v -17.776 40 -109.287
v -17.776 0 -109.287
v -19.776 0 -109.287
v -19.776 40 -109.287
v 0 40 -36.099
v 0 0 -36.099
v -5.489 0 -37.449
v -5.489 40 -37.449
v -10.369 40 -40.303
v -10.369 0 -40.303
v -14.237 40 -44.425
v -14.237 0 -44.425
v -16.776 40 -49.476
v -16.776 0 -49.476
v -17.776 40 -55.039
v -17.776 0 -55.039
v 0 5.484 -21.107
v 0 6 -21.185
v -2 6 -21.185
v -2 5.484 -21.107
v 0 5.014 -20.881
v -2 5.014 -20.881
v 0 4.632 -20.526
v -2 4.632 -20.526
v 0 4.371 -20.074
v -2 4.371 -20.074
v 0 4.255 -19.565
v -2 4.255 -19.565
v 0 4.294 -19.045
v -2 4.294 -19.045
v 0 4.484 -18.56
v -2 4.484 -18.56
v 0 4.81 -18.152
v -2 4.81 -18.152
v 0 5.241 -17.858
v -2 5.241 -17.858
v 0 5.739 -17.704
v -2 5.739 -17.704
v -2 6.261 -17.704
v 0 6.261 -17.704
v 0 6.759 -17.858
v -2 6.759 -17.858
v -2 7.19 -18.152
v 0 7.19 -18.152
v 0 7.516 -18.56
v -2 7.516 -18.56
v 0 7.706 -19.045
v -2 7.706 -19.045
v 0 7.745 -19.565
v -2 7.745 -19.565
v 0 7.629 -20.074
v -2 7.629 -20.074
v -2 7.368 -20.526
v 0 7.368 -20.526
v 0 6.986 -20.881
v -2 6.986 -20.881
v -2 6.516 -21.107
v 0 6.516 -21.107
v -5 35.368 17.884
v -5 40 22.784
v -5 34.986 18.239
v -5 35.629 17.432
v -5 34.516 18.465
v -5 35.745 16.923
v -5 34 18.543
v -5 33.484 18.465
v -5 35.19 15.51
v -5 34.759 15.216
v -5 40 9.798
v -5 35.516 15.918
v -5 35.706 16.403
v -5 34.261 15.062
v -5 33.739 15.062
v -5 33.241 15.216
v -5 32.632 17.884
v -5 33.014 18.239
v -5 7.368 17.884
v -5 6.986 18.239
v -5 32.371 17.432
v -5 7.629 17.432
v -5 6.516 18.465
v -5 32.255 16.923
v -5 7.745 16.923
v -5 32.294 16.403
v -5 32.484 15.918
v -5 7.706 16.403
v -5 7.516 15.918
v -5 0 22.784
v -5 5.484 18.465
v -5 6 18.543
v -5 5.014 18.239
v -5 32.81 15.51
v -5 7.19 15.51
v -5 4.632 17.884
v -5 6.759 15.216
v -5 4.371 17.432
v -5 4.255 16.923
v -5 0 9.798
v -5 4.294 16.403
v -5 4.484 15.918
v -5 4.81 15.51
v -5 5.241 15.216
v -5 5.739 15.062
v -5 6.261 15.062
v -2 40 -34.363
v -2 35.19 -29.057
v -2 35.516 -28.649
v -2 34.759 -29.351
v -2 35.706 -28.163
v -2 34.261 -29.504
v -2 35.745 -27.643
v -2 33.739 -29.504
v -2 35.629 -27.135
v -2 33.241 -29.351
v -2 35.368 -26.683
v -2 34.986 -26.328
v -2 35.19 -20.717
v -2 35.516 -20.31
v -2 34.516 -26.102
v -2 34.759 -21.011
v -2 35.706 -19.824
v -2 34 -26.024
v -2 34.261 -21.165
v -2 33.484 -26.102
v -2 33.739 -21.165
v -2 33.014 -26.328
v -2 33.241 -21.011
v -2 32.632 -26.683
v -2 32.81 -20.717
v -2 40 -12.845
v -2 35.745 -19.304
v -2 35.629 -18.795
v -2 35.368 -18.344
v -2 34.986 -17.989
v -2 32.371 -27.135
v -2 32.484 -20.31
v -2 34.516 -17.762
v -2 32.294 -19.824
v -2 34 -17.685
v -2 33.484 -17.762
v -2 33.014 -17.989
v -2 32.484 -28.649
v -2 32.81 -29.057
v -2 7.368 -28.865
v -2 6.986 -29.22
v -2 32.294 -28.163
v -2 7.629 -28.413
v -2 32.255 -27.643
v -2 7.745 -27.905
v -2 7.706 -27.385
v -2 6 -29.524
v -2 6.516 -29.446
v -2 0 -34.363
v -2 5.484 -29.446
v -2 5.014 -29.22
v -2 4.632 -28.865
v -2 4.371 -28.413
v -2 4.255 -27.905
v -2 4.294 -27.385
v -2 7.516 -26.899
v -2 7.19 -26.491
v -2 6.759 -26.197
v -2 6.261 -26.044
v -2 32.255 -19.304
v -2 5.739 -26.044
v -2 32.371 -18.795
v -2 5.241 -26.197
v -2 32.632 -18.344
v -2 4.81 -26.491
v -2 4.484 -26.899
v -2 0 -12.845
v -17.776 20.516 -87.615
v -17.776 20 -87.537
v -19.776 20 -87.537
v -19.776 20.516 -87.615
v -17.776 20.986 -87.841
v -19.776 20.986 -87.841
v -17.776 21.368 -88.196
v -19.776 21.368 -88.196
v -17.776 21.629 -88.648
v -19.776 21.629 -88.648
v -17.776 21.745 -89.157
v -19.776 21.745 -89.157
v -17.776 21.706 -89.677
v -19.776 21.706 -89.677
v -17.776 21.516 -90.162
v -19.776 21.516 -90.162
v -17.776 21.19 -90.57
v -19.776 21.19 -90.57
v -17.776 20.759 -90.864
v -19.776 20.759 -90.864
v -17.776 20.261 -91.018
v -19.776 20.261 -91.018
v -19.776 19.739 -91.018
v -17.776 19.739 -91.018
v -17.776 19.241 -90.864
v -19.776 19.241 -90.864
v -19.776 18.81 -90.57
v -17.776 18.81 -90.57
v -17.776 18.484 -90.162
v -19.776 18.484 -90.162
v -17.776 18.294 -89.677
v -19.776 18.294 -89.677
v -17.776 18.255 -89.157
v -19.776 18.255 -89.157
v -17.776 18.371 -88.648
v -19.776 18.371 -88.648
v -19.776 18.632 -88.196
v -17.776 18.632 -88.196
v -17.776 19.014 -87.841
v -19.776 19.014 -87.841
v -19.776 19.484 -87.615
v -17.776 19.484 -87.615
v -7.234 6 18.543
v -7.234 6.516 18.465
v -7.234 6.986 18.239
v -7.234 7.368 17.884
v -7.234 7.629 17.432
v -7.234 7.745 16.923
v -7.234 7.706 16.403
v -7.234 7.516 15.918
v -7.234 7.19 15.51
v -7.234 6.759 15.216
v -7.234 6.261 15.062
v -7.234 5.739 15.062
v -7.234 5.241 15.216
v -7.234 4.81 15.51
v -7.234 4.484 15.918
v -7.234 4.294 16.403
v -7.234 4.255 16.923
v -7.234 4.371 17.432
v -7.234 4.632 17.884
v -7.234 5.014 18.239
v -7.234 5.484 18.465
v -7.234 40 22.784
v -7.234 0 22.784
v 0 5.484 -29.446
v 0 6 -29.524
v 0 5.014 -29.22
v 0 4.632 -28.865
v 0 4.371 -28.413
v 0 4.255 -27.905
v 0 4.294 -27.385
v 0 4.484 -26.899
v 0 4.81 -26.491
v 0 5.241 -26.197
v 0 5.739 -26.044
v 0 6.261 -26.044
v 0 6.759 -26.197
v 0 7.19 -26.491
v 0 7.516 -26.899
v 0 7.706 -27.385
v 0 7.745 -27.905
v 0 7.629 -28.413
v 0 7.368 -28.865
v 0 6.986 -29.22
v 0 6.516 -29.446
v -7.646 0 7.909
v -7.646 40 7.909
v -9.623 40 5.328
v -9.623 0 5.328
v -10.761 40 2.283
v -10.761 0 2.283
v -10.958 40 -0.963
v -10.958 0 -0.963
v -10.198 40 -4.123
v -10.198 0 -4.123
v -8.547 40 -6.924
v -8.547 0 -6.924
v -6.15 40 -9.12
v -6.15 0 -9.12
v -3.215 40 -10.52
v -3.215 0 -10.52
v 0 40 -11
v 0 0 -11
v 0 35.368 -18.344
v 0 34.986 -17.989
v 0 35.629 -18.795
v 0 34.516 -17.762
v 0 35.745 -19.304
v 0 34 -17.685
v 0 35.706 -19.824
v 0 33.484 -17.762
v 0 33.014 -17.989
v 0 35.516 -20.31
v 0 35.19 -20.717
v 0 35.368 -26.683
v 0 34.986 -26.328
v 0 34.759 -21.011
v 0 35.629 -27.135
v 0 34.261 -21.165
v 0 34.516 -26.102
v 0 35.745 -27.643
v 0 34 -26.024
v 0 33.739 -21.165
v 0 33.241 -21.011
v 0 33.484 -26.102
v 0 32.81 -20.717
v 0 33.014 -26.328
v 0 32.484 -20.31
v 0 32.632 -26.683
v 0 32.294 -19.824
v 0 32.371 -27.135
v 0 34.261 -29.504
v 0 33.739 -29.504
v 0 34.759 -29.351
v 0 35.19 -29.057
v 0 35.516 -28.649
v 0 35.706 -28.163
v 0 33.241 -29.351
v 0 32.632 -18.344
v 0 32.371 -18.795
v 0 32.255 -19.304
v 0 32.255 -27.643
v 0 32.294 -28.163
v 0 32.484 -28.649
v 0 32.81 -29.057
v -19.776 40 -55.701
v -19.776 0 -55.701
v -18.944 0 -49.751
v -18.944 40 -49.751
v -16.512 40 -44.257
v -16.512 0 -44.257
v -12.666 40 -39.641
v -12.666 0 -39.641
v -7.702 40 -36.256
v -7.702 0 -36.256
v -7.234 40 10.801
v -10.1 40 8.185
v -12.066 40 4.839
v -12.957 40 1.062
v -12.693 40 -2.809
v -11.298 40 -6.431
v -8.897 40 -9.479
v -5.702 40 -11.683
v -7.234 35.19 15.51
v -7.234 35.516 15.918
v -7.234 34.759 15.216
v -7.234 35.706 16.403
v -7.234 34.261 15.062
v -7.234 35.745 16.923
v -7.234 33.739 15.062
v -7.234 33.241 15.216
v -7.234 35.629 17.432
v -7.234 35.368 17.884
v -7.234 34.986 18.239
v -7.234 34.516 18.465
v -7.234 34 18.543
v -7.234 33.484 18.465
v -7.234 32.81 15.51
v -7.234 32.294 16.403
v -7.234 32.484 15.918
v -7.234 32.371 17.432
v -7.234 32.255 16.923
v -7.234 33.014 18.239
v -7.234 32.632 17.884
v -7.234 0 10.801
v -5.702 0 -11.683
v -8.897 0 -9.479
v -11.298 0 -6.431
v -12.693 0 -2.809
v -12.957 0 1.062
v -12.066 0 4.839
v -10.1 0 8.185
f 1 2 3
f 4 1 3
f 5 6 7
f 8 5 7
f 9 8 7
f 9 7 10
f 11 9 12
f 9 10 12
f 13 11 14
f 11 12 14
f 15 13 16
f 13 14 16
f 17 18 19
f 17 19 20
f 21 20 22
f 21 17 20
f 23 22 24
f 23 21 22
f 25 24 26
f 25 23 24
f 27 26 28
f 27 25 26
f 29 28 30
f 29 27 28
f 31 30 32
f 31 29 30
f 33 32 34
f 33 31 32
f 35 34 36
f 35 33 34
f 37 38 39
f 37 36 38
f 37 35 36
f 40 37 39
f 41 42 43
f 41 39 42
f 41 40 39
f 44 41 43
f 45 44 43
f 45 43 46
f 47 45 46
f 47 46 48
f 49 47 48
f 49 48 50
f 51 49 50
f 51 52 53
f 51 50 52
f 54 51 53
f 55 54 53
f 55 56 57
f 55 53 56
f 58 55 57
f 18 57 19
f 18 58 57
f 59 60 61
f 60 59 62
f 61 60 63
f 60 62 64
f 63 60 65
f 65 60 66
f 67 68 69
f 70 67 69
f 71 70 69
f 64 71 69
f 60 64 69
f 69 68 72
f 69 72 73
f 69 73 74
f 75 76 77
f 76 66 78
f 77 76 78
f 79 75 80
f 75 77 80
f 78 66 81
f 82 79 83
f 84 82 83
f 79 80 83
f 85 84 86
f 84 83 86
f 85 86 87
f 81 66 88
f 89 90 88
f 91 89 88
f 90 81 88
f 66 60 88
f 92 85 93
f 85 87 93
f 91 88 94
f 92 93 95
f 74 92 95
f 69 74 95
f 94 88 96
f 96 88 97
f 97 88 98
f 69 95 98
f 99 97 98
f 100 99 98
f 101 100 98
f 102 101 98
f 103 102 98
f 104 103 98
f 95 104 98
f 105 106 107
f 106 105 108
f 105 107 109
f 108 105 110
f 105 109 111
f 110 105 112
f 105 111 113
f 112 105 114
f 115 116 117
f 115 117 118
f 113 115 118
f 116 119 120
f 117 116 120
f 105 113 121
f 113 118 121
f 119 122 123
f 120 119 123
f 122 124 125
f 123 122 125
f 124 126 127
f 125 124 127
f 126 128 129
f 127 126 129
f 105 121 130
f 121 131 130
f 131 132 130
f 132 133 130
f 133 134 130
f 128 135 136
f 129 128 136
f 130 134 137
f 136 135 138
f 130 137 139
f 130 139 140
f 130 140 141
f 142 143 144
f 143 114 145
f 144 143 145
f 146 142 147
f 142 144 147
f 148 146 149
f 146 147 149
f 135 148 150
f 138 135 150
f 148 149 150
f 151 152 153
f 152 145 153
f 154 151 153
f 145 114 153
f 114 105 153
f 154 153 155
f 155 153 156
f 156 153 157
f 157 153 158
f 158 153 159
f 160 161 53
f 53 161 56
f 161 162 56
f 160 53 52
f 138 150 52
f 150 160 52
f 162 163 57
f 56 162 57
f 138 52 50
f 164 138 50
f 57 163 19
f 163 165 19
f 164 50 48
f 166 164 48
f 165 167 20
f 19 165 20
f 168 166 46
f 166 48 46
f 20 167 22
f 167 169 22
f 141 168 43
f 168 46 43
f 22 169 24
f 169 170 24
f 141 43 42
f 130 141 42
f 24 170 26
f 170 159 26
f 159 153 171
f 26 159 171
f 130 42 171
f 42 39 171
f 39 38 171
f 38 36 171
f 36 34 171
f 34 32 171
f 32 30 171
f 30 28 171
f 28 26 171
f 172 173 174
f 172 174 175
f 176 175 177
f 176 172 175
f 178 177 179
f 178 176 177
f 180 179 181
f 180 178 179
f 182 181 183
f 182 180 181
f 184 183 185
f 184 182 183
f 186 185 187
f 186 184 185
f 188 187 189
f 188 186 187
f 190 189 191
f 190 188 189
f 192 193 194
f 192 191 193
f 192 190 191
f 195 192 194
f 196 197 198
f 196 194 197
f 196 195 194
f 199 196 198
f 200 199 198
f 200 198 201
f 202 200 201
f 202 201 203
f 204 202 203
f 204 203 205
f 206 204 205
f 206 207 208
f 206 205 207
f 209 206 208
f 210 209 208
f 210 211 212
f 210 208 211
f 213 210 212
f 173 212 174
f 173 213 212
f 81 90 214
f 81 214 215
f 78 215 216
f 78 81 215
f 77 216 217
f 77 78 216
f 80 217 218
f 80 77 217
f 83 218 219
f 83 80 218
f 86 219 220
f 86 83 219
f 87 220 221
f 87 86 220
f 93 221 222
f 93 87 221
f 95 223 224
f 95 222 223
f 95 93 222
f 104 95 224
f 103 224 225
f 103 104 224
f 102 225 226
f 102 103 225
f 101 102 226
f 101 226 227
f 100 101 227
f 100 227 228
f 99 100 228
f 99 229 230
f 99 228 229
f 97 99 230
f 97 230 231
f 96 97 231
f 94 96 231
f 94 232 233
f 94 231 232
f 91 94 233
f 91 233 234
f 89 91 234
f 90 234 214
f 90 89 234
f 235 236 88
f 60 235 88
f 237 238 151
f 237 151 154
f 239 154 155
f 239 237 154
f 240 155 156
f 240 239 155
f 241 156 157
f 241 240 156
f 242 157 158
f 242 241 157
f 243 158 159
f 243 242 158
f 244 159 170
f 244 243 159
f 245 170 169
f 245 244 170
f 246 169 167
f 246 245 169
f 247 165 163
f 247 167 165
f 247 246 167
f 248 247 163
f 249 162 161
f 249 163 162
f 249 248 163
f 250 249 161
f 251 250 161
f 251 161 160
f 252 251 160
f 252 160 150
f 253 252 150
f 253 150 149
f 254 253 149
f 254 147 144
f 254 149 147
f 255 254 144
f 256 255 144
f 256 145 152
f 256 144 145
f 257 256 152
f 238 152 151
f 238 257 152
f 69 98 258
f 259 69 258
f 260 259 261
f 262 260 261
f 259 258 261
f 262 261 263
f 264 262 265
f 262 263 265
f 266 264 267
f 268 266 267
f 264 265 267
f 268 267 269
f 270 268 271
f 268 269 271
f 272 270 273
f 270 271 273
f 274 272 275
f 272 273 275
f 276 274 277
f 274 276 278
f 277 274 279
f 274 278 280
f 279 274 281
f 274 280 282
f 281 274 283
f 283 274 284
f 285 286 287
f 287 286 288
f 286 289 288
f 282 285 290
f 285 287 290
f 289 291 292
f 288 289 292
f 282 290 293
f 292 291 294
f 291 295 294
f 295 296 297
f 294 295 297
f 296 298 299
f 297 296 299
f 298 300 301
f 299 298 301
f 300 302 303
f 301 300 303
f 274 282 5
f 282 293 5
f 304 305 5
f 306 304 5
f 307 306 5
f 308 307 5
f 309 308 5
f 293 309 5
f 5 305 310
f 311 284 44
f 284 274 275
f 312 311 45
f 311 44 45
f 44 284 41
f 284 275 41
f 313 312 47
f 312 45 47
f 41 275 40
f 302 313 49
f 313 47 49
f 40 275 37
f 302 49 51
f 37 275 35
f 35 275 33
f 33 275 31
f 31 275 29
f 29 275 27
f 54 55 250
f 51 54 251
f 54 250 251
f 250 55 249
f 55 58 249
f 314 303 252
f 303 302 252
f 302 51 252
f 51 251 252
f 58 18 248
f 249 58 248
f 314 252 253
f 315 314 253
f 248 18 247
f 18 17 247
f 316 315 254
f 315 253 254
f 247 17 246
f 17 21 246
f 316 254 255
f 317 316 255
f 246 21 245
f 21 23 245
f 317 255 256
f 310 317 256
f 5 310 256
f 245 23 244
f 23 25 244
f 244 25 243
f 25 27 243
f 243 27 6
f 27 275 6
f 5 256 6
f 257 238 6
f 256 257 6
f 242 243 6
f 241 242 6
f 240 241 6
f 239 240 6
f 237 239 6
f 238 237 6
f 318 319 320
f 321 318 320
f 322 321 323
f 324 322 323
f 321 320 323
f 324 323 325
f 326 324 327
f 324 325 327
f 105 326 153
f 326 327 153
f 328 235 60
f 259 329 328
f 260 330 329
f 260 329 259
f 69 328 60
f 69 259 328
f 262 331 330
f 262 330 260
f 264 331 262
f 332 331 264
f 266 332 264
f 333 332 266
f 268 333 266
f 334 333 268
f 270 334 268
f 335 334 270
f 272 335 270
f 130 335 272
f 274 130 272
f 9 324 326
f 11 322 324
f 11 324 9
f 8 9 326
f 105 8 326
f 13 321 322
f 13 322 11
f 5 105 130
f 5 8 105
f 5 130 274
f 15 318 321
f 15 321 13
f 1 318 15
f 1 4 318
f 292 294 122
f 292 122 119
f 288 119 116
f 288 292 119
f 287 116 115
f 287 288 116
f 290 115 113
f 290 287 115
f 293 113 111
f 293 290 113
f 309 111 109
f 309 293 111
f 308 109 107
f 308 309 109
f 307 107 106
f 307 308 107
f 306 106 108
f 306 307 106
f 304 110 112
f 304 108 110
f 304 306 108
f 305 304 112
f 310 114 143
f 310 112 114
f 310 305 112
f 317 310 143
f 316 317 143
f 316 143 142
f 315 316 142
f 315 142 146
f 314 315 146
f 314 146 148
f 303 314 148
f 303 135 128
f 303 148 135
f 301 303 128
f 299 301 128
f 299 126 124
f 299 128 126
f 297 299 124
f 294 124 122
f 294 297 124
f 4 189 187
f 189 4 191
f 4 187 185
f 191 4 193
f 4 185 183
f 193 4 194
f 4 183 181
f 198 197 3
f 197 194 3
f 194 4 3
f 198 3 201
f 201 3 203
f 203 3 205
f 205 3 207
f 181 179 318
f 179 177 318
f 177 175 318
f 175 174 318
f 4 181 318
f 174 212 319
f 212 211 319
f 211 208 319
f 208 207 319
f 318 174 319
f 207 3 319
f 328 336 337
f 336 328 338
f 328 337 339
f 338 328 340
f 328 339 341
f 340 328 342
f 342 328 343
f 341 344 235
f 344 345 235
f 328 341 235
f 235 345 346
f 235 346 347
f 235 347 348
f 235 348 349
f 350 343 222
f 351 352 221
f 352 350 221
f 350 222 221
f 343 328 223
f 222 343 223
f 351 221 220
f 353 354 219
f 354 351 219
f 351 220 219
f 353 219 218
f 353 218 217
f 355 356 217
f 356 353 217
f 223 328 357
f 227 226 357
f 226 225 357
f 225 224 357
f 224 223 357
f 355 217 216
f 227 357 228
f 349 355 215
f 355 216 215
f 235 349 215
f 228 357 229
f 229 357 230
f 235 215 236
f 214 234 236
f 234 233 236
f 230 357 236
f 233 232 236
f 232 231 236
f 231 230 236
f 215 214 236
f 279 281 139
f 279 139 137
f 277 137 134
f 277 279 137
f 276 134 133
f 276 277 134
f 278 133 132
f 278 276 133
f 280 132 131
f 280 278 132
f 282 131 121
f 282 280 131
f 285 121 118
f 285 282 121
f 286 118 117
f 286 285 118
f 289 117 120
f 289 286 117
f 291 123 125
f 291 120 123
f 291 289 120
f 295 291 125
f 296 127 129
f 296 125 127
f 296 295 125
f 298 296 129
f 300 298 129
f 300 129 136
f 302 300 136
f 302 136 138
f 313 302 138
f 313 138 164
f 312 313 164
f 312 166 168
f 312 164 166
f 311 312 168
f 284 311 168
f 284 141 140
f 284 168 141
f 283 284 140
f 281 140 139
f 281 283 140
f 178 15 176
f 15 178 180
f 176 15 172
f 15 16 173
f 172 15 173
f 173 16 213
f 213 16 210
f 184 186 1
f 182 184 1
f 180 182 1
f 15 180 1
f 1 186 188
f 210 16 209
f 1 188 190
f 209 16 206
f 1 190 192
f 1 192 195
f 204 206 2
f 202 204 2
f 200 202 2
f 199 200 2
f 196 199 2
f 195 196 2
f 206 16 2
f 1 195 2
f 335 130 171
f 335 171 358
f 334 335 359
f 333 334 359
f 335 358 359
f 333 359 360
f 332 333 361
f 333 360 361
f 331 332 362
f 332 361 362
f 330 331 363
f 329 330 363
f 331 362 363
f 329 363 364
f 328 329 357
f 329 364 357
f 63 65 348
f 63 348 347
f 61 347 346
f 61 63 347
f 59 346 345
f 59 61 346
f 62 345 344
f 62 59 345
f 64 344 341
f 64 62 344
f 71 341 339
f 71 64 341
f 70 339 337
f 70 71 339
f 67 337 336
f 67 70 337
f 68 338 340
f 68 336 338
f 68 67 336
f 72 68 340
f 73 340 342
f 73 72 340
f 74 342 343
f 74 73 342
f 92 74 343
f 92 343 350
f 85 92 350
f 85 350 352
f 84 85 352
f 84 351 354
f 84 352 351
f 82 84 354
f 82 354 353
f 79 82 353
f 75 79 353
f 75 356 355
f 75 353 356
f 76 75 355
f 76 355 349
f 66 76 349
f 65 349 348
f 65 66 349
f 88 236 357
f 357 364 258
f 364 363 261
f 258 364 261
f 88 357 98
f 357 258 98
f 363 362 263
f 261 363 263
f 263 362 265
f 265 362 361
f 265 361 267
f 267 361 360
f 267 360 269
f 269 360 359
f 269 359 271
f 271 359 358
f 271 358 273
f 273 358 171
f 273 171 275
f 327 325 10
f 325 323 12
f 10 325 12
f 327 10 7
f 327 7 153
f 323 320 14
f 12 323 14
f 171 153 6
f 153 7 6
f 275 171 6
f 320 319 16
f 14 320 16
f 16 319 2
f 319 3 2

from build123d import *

# Parameters (mm, degrees)
BOSS_EXTRUDE1_DEPTH     = 40
CUT_EXTRUDE1_DEPTH      = 118.727312348
CUT_EXTRUDE1_DEPTH_BACK = 118.727312348
SKETCH3_R               = 1.75


with BuildPart() as part:
    # Sketch1 → Boss-Extrude1 (new body)
    with BuildSketch(Plane(origin=(0, 0, 0), x_dir=(1, 0, 0), z_dir=(0, 1, 0))):
        with BuildLine():
            Line((0, 11), (0, 36.098802305))
            ThreePointArc((0, 36.098802305), (-12.451450114, 42.224601119), (-17.776180484, 55.03909555))
            Line((-17.776180484, 55.03909555), (-17.776180484, 109.287361941))
            Line((-17.776180484, 109.287361941), (-19.776180484, 109.287361941))
            Line((-19.776180484, 109.287361941), (-19.776180484, 55.700978031))
            ThreePointArc((-19.776180484, 55.700978031), (-14.749868805, 41.814960106), (-2, 34.363373136))
            Line((-2, 34.363373136), (-2, 12.845232579))
            ThreePointArc((-2, 12.845232579), (-12.692786177, 2.809480212), (-7.234039362, -10.801327442))
            Line((-7.234039362, -10.801327442), (-7.234039362, -22.783960598))
            Line((-7.234039362, -22.783960598), (-5, -22.783960598))
            Line((-5, -22.783960598), (-5, -9.797958971))
            ThreePointArc((-5, -9.797958971), (-10.695268783, 2.571230378), (0, 11))
        make_face()
    extrude(amount=BOSS_EXTRUDE1_DEPTH)

    # Sketch3 → Cut-Extrude1 (cut, two sides: drawn at the far end of the back side and taken through both)
    with BuildSketch(Plane.ZY.offset(2).offset(-CUT_EXTRUDE1_DEPTH_BACK)):
        with Locations((-27.77399295, 34)):
            Circle(SKETCH3_R)
        with Locations((-19.434612764, 34)):
            Circle(SKETCH3_R)
        with Locations((16.79264402, 34)):
            Circle(SKETCH3_R)
        with Locations((-89.287361941, 20)):
            Circle(SKETCH3_R)
        with Locations((16.79264402, 6)):
            Circle(SKETCH3_R)
        with Locations(Location((-19.434612764, 6, 0), (0, 0, 180))):
            Circle(SKETCH3_R)
        with Locations(Location((-27.77399295, 6, 0), (0, 0, 180))):
            Circle(SKETCH3_R)
    extrude(amount=CUT_EXTRUDE1_DEPTH + CUT_EXTRUDE1_DEPTH_BACK, mode=Mode.SUBTRACT)


solid = part.part
